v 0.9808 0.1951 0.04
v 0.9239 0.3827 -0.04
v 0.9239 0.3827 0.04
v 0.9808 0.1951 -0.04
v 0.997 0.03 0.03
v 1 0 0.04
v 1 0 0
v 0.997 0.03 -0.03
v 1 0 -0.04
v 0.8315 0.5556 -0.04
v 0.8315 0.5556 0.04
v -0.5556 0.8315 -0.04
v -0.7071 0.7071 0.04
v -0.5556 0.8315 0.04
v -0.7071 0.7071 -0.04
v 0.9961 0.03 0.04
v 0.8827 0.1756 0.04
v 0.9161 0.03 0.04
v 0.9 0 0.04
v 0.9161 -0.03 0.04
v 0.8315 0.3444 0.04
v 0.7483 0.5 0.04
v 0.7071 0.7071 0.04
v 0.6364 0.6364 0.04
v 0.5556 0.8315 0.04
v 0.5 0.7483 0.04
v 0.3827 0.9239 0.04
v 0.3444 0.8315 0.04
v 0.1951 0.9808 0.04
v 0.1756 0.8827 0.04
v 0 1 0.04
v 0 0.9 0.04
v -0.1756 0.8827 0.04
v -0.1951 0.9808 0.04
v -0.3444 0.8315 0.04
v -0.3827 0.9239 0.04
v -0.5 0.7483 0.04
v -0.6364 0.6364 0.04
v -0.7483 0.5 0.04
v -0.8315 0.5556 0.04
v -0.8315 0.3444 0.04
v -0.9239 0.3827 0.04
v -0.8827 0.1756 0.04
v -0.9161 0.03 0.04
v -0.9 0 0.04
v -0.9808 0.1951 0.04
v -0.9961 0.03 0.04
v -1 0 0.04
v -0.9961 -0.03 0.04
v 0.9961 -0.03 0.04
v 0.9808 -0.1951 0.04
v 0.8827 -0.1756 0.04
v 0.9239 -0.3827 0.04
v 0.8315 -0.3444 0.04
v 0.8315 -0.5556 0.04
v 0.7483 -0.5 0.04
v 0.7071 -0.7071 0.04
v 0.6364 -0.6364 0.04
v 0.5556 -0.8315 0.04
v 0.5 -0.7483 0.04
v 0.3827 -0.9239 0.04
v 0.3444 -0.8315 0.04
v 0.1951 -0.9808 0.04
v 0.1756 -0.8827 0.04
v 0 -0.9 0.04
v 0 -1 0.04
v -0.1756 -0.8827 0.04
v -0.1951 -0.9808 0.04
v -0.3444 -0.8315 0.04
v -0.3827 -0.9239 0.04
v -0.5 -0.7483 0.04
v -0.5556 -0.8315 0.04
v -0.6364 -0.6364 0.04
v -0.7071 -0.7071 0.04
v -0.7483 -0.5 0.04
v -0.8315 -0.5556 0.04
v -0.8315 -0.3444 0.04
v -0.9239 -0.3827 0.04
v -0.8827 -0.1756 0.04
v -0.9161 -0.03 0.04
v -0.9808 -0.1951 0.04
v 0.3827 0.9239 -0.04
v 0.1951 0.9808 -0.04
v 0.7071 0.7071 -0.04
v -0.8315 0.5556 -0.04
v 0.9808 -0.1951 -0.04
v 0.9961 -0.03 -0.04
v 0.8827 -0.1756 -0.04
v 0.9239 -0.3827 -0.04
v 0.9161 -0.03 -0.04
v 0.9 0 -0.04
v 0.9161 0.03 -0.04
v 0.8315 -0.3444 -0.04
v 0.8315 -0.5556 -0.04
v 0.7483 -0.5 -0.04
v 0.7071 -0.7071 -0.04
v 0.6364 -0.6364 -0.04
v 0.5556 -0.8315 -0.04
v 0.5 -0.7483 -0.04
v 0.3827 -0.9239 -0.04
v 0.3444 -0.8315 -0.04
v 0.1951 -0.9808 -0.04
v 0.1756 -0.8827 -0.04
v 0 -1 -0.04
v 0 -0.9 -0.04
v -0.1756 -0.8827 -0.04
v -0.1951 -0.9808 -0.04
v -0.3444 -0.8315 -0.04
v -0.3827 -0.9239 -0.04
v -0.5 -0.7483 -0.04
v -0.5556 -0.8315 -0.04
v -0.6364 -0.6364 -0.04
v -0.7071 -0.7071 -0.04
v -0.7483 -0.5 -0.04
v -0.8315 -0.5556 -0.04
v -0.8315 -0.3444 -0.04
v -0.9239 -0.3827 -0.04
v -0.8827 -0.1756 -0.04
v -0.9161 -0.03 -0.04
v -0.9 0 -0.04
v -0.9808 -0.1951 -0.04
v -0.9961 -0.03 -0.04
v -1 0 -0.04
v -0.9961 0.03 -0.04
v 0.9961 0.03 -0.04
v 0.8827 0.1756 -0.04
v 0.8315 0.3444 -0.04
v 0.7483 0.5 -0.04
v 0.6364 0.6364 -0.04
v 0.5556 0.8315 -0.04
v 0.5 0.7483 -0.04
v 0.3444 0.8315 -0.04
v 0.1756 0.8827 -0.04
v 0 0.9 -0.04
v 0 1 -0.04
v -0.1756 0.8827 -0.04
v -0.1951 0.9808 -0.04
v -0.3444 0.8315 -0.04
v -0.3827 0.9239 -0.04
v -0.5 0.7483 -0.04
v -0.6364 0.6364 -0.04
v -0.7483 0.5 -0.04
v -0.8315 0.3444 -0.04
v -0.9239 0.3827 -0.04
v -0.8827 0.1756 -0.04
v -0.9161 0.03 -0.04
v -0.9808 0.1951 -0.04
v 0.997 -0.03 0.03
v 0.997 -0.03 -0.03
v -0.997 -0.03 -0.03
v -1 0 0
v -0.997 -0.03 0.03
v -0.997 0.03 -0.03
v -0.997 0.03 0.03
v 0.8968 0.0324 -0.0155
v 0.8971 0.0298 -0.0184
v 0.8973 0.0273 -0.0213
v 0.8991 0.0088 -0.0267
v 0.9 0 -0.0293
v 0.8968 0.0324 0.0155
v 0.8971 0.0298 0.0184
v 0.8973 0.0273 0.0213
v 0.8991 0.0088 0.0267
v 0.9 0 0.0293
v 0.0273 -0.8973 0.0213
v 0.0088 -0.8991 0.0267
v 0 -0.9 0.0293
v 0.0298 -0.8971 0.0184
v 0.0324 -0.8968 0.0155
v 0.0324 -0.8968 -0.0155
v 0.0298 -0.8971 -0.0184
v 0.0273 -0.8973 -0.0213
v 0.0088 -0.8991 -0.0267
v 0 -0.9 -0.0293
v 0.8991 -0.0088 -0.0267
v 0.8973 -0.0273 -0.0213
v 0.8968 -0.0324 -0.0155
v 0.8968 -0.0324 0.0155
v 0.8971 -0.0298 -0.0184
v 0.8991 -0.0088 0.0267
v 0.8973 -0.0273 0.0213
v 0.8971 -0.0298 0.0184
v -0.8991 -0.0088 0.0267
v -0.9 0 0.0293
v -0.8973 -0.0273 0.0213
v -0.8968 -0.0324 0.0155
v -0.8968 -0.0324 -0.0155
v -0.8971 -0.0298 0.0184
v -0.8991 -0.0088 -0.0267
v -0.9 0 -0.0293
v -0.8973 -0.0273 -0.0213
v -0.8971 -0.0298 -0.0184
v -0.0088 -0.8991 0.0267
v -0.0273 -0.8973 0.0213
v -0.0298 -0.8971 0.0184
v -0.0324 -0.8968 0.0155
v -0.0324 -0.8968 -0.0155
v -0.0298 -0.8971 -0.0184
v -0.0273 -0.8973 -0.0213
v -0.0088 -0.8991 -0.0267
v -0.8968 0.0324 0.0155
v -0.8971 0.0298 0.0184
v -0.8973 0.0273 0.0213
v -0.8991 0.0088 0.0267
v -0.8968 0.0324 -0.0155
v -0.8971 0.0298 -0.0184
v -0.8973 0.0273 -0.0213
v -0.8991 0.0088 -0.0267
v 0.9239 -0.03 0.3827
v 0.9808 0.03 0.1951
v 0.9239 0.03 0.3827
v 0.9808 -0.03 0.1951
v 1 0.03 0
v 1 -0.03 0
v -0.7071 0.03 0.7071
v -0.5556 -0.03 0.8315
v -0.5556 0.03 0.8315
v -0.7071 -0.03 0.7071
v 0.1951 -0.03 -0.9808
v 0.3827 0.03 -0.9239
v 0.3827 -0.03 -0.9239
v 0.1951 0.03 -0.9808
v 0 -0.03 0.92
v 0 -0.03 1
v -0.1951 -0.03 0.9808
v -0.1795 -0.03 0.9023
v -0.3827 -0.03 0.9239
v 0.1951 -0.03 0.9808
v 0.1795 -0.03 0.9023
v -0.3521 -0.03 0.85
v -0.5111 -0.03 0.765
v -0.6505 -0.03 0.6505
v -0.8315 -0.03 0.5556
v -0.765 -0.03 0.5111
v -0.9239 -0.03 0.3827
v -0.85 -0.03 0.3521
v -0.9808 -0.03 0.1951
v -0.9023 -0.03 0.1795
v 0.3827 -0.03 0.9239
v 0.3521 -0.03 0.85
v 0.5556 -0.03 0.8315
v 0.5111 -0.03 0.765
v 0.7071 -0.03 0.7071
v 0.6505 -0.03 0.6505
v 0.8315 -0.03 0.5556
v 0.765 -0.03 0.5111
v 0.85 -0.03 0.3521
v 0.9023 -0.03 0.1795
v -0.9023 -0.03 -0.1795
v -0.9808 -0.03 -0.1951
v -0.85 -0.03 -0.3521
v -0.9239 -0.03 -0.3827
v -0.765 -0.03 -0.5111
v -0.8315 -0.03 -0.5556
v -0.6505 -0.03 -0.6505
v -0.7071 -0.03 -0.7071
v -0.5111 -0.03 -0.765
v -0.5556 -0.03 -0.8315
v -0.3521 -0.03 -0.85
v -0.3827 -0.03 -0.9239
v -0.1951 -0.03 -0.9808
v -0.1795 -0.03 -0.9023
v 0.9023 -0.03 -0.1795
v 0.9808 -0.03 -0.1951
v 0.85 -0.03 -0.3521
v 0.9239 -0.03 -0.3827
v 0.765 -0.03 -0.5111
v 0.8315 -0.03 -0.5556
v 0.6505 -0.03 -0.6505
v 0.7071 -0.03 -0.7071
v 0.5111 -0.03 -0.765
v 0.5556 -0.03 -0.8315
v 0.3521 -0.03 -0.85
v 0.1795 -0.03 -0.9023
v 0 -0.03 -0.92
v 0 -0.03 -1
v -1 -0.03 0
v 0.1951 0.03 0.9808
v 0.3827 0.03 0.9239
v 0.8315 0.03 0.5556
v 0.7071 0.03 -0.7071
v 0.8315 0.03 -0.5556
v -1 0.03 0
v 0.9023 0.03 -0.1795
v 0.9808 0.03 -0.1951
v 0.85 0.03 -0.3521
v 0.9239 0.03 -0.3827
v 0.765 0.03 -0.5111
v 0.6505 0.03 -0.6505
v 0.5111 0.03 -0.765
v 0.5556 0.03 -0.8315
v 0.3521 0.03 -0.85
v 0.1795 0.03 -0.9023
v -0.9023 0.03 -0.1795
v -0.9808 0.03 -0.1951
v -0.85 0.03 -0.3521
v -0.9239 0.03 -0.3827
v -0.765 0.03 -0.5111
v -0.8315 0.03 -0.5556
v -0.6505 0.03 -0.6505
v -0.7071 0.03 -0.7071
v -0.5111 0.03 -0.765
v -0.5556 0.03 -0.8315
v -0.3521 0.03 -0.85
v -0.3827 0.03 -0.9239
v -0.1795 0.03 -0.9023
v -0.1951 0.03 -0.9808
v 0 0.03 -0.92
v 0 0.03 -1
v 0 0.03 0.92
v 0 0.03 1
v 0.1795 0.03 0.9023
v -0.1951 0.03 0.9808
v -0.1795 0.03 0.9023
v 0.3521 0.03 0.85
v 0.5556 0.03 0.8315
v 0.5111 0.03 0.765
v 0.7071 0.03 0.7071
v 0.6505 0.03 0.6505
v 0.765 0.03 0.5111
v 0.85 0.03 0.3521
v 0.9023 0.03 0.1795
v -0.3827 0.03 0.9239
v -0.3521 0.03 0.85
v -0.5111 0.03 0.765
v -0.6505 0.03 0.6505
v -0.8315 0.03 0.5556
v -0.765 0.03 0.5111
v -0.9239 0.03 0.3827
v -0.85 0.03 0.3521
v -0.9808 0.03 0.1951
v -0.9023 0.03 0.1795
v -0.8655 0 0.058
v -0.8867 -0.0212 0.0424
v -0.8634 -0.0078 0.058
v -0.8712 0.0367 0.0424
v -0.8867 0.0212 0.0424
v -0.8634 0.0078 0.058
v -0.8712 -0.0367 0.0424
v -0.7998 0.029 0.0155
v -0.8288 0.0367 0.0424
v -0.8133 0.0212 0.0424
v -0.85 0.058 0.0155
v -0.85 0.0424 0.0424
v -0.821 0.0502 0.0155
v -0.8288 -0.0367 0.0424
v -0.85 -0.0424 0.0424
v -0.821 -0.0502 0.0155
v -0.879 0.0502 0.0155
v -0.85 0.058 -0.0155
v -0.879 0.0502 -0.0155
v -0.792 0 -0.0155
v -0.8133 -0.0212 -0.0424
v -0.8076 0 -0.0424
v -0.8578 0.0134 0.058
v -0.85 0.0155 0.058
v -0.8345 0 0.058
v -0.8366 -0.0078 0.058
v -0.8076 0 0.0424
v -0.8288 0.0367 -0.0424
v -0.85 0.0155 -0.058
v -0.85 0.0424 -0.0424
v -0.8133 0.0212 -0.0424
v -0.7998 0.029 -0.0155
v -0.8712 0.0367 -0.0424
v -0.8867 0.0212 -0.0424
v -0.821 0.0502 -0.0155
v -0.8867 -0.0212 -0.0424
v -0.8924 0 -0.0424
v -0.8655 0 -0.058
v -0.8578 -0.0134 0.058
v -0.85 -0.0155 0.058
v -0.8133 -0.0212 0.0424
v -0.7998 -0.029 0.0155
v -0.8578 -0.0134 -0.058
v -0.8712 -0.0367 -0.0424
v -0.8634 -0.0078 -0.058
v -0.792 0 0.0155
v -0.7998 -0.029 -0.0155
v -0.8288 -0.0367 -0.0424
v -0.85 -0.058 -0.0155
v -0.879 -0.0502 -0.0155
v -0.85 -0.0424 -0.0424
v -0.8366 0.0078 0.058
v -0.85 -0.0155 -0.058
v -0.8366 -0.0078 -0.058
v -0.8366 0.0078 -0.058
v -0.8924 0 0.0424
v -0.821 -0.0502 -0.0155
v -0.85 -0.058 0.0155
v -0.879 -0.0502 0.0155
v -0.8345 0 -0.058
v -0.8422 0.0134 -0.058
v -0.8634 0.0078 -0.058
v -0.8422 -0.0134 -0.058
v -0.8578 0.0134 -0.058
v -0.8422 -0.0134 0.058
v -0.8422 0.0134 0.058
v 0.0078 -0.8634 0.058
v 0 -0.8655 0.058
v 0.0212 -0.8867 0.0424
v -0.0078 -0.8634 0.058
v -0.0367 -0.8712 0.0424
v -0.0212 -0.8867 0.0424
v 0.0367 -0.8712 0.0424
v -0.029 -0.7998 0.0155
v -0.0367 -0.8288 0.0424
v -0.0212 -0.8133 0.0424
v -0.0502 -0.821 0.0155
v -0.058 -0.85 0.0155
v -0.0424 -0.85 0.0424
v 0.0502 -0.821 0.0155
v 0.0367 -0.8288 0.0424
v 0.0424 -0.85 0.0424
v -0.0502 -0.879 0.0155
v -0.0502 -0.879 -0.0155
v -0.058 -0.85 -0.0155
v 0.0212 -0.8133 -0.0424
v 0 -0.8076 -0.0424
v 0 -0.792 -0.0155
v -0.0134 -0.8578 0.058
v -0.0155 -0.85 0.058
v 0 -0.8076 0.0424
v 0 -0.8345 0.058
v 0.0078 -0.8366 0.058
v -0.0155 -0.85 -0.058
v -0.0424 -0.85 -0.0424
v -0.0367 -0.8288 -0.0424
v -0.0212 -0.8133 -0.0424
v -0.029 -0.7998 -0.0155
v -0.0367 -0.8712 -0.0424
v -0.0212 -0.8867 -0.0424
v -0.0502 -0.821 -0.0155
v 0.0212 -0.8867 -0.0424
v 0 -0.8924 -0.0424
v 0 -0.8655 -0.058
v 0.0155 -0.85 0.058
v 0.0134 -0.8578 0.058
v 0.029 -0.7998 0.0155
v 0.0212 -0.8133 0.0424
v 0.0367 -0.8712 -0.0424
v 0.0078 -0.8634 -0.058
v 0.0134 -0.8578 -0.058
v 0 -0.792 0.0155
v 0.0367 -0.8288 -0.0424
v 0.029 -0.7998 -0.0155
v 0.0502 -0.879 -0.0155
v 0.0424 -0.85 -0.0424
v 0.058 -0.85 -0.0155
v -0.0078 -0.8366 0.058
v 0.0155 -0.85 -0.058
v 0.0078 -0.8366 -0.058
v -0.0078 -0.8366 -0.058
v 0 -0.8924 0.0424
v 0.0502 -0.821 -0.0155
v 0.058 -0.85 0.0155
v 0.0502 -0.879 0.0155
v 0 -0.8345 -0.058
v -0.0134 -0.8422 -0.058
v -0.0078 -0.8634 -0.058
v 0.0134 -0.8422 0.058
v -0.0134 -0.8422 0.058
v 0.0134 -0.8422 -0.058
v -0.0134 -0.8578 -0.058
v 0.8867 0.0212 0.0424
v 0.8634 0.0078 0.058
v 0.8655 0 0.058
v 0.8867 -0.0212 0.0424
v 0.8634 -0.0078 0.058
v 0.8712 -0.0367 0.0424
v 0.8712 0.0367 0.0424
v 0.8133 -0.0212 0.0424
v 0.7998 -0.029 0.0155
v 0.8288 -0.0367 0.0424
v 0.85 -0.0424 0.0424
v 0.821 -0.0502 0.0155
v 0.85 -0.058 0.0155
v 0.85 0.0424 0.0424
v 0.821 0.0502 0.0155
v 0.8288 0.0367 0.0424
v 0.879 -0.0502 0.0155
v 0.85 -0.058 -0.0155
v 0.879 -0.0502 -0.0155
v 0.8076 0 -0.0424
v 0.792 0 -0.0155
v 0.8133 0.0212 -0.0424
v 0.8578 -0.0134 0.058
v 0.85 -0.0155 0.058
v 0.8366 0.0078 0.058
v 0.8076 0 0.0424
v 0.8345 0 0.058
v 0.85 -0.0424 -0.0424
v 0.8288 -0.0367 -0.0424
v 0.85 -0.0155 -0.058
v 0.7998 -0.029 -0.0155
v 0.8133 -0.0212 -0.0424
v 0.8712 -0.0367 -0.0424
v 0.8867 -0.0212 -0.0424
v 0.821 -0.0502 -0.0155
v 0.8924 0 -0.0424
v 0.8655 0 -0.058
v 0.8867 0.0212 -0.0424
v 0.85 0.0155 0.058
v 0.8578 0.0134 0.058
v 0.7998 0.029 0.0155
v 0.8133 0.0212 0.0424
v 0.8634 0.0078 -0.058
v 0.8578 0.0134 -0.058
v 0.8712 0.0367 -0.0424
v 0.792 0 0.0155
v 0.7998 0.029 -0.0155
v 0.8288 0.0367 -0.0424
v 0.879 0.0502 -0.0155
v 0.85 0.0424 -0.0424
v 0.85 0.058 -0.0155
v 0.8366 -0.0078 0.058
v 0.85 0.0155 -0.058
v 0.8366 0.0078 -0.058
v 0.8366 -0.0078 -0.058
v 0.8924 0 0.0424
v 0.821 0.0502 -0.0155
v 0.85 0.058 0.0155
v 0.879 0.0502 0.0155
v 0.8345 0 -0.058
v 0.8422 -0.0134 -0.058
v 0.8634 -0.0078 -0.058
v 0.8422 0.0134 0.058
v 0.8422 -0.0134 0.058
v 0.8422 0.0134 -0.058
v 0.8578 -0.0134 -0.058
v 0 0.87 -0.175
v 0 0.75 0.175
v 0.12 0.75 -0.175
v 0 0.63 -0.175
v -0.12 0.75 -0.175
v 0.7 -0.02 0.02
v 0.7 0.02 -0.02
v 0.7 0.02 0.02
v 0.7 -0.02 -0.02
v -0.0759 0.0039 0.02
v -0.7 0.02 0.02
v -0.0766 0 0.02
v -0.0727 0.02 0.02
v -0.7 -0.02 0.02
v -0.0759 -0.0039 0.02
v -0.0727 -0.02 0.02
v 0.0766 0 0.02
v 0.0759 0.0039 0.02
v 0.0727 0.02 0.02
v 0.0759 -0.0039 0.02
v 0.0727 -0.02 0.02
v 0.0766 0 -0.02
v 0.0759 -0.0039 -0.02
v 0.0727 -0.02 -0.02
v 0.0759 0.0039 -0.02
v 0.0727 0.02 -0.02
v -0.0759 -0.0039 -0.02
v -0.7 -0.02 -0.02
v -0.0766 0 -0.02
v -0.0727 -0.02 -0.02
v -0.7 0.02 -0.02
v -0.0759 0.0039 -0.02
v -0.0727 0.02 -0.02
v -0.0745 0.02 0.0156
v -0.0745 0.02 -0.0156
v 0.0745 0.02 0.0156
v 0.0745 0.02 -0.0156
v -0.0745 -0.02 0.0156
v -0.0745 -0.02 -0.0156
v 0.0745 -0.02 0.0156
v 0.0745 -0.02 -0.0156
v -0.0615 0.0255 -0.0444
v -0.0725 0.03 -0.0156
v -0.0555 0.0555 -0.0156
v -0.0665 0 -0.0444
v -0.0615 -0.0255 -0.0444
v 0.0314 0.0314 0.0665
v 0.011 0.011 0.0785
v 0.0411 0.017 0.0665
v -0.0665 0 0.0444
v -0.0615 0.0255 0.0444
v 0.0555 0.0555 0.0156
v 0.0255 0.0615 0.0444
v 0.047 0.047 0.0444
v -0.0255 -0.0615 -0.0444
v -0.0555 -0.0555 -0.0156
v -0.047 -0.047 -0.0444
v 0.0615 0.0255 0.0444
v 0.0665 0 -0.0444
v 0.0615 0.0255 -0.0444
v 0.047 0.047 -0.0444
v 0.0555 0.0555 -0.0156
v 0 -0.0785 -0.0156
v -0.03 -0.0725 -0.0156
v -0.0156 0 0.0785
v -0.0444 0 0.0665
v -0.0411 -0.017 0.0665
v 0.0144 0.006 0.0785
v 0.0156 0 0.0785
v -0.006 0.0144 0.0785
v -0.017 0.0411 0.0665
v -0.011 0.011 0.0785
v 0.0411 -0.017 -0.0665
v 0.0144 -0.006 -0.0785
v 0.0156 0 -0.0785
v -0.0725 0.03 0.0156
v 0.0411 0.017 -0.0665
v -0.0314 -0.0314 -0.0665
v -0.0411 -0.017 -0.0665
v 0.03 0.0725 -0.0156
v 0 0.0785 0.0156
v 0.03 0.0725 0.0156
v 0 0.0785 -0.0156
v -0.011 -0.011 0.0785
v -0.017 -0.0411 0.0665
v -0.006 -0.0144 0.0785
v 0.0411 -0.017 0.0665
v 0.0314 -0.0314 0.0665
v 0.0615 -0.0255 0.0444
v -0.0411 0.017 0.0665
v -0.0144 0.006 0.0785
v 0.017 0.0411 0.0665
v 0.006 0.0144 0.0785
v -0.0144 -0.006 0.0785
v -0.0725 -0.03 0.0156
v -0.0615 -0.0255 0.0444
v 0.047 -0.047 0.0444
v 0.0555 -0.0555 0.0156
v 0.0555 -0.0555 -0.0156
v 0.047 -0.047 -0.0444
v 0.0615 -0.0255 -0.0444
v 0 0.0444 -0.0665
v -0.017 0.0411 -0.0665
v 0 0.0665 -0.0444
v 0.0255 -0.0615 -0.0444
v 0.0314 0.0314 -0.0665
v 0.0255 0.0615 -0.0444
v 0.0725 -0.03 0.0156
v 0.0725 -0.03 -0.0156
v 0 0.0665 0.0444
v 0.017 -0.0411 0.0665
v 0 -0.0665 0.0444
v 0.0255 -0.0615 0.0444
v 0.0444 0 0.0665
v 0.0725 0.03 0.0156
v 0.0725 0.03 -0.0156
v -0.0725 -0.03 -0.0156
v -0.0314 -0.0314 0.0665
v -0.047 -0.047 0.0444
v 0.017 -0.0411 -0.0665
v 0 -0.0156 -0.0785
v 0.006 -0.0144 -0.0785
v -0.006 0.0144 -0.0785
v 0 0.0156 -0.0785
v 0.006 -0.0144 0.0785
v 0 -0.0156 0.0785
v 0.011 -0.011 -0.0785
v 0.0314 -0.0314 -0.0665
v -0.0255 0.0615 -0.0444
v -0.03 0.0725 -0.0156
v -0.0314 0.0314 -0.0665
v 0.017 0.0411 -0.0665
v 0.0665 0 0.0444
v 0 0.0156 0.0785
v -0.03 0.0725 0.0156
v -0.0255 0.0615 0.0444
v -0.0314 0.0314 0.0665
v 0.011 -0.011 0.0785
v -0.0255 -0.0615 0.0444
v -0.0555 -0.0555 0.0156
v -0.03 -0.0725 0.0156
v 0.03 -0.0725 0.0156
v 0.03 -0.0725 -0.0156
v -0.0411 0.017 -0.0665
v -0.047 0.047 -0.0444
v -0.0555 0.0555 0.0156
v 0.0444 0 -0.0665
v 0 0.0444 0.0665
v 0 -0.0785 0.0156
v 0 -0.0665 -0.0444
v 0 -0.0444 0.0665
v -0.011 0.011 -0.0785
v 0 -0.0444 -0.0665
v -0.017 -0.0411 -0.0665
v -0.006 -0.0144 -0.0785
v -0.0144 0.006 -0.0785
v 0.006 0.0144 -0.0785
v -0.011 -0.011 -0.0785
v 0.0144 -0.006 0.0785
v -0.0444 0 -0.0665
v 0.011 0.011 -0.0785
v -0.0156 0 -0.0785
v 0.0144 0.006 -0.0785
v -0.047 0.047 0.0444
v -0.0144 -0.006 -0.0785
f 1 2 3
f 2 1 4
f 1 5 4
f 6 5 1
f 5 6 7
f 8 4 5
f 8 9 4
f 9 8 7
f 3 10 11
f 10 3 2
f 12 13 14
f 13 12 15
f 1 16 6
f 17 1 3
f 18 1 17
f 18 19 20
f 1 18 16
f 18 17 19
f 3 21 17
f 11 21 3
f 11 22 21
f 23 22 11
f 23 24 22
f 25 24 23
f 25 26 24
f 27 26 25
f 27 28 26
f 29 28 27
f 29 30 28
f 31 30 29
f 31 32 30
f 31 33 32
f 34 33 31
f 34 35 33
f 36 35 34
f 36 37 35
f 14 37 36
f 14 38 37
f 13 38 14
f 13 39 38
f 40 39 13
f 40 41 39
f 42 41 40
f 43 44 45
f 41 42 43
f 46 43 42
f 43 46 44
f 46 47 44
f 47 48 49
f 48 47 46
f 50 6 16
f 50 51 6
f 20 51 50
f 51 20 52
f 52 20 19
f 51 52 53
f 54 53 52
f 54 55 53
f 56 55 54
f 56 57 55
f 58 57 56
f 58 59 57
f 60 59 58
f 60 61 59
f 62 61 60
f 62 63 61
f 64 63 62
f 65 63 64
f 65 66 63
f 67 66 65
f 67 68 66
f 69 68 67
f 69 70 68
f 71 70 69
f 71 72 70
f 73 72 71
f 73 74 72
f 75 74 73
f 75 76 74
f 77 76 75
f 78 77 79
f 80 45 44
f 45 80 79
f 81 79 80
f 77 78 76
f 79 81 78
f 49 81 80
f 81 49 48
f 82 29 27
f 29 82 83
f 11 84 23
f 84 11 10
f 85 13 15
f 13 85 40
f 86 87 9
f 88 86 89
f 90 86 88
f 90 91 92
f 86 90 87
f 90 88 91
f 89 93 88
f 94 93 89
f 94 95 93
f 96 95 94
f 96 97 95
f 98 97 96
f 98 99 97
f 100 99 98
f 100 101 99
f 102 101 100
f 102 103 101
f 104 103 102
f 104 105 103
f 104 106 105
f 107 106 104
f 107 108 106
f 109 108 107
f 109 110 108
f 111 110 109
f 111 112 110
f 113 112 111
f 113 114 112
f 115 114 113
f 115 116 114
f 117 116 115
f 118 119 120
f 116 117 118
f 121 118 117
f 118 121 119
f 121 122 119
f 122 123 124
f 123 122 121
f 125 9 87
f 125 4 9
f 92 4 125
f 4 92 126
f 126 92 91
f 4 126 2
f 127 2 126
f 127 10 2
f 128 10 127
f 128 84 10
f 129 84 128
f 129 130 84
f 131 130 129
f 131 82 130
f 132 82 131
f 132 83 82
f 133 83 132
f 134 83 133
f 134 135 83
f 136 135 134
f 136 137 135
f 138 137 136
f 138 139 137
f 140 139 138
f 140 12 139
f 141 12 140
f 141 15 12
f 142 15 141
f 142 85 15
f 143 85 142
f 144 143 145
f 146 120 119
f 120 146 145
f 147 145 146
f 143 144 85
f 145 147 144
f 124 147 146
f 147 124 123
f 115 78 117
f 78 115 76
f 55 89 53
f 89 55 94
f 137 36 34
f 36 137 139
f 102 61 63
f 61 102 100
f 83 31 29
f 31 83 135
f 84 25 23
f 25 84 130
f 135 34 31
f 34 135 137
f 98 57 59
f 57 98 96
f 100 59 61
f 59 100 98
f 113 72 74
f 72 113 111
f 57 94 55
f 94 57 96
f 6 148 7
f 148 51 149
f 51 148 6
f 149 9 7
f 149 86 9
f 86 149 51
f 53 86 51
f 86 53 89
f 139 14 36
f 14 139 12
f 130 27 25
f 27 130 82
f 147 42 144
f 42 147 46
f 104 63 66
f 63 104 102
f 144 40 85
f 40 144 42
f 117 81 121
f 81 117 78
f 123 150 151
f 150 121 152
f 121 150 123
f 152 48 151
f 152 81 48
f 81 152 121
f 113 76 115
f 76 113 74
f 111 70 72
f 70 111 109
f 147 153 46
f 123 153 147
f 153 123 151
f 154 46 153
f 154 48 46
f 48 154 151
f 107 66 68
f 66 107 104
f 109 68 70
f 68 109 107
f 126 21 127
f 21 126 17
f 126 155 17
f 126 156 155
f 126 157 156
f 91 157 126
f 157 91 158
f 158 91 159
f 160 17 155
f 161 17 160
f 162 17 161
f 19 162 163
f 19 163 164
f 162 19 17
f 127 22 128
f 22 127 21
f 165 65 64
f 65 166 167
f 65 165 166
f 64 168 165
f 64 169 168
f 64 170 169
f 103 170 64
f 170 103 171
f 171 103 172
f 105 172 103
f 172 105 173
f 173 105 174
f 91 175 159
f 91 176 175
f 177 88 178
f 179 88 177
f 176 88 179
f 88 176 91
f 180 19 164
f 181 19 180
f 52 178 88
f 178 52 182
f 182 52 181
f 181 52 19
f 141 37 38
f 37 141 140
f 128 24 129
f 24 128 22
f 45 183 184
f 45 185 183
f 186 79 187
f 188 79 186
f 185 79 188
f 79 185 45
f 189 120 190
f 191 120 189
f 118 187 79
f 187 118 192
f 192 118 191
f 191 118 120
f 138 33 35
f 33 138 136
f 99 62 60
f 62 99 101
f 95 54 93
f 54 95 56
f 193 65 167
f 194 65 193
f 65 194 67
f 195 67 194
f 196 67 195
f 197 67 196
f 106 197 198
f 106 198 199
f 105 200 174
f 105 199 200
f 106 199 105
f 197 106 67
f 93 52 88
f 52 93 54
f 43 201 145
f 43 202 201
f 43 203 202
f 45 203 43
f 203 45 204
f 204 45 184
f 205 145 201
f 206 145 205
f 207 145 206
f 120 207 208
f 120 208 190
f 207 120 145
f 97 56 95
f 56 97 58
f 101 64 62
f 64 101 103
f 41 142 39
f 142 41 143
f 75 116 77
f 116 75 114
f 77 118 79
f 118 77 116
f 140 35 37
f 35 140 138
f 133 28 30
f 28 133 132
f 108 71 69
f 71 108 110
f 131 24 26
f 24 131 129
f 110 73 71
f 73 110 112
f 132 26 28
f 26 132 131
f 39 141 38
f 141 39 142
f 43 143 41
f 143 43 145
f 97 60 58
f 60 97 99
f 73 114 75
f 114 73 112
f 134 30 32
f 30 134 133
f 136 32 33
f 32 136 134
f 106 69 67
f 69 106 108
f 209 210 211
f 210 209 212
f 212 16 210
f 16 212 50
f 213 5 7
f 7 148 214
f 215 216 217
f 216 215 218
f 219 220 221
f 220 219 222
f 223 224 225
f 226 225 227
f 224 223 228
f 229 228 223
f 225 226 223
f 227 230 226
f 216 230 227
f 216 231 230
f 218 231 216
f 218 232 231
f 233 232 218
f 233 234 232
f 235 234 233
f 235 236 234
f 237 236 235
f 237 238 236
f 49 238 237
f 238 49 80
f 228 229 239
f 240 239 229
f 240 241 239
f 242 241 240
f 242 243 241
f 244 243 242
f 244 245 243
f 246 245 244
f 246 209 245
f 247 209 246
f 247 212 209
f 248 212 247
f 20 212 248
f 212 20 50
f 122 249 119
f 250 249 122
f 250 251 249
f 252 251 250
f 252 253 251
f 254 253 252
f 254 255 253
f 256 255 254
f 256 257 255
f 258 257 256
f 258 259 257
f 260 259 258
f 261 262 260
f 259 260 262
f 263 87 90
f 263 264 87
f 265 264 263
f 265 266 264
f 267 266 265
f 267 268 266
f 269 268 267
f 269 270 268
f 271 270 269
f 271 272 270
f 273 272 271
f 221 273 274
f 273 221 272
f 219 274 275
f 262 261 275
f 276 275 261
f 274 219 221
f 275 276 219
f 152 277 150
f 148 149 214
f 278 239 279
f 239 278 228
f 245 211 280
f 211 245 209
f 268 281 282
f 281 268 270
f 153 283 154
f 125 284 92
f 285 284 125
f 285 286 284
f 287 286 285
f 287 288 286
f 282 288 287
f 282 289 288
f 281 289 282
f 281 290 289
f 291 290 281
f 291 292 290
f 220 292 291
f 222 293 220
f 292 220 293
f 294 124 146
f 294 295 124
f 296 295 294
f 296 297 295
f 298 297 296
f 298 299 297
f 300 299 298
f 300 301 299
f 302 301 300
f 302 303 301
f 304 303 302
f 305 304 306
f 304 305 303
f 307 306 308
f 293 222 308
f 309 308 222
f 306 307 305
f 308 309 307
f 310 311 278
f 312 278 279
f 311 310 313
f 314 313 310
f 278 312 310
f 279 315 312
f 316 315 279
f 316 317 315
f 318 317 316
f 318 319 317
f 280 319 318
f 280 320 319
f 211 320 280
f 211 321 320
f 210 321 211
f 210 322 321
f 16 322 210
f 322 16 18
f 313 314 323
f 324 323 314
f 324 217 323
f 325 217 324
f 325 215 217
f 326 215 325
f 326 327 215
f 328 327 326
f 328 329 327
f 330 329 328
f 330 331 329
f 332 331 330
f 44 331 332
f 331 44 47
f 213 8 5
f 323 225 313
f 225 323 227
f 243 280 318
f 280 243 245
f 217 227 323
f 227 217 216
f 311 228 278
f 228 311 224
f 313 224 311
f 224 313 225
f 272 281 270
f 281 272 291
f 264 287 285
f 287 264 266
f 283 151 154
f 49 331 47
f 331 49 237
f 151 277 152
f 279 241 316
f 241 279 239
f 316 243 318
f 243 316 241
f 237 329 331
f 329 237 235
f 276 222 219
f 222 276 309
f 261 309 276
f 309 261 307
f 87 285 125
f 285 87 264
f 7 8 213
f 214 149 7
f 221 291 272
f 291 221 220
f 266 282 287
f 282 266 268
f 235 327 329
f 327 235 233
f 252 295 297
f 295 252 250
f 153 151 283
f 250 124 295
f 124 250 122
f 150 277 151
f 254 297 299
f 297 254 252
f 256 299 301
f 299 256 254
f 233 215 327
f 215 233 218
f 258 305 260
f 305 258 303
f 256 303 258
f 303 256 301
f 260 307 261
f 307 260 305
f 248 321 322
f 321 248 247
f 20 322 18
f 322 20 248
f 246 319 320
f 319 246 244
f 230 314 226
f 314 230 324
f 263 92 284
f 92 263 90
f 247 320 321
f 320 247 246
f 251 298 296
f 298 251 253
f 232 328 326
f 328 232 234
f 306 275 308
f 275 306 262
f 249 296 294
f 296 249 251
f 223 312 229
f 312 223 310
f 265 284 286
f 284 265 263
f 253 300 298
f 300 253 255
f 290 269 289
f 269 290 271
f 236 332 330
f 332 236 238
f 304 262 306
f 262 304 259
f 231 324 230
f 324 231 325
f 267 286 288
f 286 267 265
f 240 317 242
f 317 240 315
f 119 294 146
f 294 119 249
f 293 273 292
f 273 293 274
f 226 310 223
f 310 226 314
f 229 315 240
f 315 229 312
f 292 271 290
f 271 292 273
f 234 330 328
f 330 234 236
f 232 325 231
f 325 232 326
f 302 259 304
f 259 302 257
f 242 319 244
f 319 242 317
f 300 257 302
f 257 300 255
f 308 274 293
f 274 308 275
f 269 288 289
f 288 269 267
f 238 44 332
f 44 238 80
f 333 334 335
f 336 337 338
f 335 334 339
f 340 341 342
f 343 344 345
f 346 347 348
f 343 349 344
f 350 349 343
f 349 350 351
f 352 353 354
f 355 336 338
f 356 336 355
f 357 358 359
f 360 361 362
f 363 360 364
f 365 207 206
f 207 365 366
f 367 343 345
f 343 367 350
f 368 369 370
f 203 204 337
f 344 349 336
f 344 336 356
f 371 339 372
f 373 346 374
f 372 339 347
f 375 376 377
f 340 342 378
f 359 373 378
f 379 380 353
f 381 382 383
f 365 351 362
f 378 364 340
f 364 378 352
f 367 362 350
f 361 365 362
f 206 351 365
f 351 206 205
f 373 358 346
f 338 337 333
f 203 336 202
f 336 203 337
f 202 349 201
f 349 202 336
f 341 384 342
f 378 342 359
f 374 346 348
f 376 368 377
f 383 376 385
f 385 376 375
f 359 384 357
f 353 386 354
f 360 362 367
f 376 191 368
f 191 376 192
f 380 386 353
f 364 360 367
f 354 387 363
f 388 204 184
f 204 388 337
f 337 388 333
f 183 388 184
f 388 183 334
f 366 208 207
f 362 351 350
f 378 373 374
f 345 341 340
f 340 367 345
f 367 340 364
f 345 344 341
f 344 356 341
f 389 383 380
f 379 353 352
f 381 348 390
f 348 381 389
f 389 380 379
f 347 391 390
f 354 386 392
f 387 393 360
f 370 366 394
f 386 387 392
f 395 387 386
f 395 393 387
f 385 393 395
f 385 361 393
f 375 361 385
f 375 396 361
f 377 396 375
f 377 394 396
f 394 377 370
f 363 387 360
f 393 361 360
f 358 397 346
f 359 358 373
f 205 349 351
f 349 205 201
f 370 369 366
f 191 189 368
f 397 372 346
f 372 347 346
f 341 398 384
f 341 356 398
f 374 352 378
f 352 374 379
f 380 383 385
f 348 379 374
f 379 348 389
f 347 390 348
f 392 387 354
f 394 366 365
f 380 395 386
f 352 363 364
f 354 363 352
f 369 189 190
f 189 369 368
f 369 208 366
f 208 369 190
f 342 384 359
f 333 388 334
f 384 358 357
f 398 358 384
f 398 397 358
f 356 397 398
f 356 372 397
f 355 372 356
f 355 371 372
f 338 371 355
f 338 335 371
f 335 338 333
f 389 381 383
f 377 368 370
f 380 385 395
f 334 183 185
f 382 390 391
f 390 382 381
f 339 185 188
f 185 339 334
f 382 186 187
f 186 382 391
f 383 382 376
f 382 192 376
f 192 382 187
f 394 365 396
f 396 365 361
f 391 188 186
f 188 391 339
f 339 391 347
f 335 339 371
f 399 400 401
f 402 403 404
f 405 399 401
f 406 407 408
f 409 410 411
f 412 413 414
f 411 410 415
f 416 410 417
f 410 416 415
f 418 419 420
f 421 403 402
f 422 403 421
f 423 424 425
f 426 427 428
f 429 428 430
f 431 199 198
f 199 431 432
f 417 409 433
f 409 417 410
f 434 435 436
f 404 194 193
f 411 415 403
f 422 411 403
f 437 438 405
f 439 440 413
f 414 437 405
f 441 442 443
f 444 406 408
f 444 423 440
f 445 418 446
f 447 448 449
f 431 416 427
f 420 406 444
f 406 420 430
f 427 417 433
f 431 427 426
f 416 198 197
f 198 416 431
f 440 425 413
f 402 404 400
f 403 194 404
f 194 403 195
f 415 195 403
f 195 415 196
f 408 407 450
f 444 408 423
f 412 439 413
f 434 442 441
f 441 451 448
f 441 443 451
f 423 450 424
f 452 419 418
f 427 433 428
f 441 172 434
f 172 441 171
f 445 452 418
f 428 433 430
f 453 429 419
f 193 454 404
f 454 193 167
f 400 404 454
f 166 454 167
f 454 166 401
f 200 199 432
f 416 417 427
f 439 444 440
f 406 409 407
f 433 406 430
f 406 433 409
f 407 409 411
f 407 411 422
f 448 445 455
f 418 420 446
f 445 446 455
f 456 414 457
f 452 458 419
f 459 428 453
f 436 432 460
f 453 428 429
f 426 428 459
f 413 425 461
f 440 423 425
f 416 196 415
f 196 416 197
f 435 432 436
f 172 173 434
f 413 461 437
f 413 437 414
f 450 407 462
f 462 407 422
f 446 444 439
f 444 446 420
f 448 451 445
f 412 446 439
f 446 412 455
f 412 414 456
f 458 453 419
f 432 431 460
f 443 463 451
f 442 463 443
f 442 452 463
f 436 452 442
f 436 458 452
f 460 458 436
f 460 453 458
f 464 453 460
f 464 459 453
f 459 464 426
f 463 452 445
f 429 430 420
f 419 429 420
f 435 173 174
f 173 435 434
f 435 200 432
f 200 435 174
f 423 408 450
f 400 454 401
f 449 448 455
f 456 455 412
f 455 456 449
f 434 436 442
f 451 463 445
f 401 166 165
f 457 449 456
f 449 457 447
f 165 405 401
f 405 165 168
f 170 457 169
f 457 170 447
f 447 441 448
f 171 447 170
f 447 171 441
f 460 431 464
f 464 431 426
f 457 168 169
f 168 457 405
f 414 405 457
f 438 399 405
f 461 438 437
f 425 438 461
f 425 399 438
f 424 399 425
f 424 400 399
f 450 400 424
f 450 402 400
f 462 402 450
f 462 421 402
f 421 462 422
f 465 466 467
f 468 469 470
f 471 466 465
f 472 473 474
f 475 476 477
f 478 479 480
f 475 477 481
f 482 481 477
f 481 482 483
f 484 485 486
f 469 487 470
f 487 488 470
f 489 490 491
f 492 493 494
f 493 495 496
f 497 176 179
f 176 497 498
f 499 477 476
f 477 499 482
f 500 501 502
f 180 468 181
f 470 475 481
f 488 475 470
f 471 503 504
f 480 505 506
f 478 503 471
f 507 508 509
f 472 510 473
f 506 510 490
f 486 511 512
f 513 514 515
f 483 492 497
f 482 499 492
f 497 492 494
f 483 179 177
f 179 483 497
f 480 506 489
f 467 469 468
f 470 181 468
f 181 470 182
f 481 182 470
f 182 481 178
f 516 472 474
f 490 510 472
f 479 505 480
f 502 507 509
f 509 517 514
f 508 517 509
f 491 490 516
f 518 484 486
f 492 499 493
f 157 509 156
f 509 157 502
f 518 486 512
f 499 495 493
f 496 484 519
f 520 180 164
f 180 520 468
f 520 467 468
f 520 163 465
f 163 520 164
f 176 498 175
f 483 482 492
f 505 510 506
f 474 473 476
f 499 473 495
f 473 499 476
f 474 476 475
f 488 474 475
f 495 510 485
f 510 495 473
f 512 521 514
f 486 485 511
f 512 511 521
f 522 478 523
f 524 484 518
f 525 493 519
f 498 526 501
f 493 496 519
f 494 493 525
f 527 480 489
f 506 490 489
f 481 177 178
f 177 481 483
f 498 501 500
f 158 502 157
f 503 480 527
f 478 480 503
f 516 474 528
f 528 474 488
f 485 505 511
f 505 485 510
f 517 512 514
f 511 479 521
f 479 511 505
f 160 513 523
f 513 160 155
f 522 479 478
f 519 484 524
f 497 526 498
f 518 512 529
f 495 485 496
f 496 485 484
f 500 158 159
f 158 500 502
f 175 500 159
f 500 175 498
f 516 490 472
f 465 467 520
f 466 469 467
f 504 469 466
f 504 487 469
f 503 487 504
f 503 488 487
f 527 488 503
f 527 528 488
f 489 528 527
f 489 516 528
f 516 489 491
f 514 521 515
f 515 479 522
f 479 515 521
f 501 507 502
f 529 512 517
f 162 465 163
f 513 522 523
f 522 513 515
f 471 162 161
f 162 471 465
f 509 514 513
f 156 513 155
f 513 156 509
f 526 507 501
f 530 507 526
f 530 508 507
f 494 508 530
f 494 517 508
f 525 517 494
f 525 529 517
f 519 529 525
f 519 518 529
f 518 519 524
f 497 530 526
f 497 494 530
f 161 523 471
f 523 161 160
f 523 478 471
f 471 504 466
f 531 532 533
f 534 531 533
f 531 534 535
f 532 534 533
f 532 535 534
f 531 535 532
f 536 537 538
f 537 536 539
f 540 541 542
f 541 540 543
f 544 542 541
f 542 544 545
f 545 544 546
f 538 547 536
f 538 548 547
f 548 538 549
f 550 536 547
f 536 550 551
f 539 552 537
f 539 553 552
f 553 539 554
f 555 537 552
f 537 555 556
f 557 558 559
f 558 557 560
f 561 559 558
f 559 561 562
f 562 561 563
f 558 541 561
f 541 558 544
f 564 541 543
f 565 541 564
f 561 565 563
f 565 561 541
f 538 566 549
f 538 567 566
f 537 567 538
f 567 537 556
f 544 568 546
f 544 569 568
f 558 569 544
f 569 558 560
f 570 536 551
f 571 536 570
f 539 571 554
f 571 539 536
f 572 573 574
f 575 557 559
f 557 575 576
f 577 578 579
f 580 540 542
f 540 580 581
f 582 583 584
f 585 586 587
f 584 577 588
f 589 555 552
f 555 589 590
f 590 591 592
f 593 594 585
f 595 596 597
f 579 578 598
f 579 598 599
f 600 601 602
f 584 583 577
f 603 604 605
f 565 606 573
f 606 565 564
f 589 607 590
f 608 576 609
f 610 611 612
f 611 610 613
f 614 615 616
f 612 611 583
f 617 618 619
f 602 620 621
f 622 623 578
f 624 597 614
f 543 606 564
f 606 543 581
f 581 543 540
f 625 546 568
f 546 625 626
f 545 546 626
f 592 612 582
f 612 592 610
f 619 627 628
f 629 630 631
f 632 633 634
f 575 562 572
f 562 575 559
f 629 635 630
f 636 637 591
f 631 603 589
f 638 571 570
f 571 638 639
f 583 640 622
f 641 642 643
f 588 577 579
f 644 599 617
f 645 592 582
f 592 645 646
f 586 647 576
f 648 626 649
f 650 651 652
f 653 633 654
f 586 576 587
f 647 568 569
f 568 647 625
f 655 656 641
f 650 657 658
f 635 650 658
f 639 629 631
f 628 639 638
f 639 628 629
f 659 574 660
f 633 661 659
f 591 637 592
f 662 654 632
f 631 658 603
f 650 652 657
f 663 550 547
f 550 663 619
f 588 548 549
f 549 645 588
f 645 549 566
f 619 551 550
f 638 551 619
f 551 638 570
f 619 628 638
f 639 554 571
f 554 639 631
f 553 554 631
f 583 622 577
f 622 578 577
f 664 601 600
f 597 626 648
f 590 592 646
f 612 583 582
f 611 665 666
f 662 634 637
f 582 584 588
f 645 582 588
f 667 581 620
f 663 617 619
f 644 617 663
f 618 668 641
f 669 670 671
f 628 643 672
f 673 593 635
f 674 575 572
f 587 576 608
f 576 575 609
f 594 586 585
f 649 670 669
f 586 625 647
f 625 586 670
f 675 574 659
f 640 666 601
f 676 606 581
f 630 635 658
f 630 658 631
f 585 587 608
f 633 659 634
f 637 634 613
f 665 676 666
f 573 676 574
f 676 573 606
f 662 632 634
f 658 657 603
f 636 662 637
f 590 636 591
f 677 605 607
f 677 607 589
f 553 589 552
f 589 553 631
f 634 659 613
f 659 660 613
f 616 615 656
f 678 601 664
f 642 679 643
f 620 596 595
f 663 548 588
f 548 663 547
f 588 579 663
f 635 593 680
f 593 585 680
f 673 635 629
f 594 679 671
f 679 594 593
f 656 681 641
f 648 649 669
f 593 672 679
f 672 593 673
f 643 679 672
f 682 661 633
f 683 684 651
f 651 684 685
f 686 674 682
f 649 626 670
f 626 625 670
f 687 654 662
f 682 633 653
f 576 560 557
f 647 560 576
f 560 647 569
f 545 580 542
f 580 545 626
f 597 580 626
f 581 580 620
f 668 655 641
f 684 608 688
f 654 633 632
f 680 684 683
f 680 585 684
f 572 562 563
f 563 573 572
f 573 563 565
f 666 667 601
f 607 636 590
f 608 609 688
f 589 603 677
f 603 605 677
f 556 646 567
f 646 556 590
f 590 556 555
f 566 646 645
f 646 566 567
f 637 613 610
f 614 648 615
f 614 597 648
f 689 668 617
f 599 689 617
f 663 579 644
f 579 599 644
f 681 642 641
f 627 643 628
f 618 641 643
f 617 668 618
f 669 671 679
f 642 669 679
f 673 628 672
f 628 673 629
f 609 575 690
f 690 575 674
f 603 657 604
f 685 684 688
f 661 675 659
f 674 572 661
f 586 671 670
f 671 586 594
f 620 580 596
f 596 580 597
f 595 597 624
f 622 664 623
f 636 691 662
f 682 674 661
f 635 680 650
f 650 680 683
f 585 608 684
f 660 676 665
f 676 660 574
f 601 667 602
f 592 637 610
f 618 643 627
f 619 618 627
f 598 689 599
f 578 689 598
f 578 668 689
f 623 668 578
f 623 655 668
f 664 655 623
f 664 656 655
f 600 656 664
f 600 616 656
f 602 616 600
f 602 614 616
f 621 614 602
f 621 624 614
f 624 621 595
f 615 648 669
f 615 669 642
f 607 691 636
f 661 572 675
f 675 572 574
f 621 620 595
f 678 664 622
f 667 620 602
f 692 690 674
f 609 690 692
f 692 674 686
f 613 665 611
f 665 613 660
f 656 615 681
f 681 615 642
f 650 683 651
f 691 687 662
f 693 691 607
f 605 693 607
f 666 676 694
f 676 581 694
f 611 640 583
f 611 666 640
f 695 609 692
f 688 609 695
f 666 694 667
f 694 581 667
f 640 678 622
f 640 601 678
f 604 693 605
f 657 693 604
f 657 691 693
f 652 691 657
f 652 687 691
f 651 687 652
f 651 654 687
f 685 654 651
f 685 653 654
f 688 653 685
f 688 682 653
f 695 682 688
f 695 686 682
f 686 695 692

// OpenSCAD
// camera_hud_gimbal.scad
// 3D Camera HUD Attitude & Heading Gimbal.
// Mounted in camera-local space as a 3D in-scene instrument.
// Authored for WoWViewer camera-rigged 3D HUD.

$fn = 32;

module camera_hud_gimbal() {
    // Outer yaw ring (equator)
    difference() {
        cylinder(r = 1.0, h = 0.08, center = true);
        cylinder(r = 0.90, h = 0.15, center = true);
    }

    // Outer pitch ring (vertical meridian)
    difference() {
        rotate([90, 0, 0])
        cylinder(r = 1.0, h = 0.06, center = true);
        rotate([90, 0, 0])
        cylinder(r = 0.92, h = 0.15, center = true);
    }

    // North arrow indicator (prominent arrow pointing +Y)
    translate([0, 0.75, 0])
    cylinder(r1 = 0.12, r2 = 0.0, h = 0.35, center = true, $fn = 4);

    // South, East, West pips
    for (a = [90, 180, 270]) {
        rotate([0, 0, a])
        translate([0, 0.85, 0])
        sphere(r = 0.06, $fn = 12);
    }

    // Center horizon attitude bar
    cube([1.4, 0.04, 0.04], center = true);
    sphere(r = 0.08, $fn = 16);
}

camera_hud_gimbal();
